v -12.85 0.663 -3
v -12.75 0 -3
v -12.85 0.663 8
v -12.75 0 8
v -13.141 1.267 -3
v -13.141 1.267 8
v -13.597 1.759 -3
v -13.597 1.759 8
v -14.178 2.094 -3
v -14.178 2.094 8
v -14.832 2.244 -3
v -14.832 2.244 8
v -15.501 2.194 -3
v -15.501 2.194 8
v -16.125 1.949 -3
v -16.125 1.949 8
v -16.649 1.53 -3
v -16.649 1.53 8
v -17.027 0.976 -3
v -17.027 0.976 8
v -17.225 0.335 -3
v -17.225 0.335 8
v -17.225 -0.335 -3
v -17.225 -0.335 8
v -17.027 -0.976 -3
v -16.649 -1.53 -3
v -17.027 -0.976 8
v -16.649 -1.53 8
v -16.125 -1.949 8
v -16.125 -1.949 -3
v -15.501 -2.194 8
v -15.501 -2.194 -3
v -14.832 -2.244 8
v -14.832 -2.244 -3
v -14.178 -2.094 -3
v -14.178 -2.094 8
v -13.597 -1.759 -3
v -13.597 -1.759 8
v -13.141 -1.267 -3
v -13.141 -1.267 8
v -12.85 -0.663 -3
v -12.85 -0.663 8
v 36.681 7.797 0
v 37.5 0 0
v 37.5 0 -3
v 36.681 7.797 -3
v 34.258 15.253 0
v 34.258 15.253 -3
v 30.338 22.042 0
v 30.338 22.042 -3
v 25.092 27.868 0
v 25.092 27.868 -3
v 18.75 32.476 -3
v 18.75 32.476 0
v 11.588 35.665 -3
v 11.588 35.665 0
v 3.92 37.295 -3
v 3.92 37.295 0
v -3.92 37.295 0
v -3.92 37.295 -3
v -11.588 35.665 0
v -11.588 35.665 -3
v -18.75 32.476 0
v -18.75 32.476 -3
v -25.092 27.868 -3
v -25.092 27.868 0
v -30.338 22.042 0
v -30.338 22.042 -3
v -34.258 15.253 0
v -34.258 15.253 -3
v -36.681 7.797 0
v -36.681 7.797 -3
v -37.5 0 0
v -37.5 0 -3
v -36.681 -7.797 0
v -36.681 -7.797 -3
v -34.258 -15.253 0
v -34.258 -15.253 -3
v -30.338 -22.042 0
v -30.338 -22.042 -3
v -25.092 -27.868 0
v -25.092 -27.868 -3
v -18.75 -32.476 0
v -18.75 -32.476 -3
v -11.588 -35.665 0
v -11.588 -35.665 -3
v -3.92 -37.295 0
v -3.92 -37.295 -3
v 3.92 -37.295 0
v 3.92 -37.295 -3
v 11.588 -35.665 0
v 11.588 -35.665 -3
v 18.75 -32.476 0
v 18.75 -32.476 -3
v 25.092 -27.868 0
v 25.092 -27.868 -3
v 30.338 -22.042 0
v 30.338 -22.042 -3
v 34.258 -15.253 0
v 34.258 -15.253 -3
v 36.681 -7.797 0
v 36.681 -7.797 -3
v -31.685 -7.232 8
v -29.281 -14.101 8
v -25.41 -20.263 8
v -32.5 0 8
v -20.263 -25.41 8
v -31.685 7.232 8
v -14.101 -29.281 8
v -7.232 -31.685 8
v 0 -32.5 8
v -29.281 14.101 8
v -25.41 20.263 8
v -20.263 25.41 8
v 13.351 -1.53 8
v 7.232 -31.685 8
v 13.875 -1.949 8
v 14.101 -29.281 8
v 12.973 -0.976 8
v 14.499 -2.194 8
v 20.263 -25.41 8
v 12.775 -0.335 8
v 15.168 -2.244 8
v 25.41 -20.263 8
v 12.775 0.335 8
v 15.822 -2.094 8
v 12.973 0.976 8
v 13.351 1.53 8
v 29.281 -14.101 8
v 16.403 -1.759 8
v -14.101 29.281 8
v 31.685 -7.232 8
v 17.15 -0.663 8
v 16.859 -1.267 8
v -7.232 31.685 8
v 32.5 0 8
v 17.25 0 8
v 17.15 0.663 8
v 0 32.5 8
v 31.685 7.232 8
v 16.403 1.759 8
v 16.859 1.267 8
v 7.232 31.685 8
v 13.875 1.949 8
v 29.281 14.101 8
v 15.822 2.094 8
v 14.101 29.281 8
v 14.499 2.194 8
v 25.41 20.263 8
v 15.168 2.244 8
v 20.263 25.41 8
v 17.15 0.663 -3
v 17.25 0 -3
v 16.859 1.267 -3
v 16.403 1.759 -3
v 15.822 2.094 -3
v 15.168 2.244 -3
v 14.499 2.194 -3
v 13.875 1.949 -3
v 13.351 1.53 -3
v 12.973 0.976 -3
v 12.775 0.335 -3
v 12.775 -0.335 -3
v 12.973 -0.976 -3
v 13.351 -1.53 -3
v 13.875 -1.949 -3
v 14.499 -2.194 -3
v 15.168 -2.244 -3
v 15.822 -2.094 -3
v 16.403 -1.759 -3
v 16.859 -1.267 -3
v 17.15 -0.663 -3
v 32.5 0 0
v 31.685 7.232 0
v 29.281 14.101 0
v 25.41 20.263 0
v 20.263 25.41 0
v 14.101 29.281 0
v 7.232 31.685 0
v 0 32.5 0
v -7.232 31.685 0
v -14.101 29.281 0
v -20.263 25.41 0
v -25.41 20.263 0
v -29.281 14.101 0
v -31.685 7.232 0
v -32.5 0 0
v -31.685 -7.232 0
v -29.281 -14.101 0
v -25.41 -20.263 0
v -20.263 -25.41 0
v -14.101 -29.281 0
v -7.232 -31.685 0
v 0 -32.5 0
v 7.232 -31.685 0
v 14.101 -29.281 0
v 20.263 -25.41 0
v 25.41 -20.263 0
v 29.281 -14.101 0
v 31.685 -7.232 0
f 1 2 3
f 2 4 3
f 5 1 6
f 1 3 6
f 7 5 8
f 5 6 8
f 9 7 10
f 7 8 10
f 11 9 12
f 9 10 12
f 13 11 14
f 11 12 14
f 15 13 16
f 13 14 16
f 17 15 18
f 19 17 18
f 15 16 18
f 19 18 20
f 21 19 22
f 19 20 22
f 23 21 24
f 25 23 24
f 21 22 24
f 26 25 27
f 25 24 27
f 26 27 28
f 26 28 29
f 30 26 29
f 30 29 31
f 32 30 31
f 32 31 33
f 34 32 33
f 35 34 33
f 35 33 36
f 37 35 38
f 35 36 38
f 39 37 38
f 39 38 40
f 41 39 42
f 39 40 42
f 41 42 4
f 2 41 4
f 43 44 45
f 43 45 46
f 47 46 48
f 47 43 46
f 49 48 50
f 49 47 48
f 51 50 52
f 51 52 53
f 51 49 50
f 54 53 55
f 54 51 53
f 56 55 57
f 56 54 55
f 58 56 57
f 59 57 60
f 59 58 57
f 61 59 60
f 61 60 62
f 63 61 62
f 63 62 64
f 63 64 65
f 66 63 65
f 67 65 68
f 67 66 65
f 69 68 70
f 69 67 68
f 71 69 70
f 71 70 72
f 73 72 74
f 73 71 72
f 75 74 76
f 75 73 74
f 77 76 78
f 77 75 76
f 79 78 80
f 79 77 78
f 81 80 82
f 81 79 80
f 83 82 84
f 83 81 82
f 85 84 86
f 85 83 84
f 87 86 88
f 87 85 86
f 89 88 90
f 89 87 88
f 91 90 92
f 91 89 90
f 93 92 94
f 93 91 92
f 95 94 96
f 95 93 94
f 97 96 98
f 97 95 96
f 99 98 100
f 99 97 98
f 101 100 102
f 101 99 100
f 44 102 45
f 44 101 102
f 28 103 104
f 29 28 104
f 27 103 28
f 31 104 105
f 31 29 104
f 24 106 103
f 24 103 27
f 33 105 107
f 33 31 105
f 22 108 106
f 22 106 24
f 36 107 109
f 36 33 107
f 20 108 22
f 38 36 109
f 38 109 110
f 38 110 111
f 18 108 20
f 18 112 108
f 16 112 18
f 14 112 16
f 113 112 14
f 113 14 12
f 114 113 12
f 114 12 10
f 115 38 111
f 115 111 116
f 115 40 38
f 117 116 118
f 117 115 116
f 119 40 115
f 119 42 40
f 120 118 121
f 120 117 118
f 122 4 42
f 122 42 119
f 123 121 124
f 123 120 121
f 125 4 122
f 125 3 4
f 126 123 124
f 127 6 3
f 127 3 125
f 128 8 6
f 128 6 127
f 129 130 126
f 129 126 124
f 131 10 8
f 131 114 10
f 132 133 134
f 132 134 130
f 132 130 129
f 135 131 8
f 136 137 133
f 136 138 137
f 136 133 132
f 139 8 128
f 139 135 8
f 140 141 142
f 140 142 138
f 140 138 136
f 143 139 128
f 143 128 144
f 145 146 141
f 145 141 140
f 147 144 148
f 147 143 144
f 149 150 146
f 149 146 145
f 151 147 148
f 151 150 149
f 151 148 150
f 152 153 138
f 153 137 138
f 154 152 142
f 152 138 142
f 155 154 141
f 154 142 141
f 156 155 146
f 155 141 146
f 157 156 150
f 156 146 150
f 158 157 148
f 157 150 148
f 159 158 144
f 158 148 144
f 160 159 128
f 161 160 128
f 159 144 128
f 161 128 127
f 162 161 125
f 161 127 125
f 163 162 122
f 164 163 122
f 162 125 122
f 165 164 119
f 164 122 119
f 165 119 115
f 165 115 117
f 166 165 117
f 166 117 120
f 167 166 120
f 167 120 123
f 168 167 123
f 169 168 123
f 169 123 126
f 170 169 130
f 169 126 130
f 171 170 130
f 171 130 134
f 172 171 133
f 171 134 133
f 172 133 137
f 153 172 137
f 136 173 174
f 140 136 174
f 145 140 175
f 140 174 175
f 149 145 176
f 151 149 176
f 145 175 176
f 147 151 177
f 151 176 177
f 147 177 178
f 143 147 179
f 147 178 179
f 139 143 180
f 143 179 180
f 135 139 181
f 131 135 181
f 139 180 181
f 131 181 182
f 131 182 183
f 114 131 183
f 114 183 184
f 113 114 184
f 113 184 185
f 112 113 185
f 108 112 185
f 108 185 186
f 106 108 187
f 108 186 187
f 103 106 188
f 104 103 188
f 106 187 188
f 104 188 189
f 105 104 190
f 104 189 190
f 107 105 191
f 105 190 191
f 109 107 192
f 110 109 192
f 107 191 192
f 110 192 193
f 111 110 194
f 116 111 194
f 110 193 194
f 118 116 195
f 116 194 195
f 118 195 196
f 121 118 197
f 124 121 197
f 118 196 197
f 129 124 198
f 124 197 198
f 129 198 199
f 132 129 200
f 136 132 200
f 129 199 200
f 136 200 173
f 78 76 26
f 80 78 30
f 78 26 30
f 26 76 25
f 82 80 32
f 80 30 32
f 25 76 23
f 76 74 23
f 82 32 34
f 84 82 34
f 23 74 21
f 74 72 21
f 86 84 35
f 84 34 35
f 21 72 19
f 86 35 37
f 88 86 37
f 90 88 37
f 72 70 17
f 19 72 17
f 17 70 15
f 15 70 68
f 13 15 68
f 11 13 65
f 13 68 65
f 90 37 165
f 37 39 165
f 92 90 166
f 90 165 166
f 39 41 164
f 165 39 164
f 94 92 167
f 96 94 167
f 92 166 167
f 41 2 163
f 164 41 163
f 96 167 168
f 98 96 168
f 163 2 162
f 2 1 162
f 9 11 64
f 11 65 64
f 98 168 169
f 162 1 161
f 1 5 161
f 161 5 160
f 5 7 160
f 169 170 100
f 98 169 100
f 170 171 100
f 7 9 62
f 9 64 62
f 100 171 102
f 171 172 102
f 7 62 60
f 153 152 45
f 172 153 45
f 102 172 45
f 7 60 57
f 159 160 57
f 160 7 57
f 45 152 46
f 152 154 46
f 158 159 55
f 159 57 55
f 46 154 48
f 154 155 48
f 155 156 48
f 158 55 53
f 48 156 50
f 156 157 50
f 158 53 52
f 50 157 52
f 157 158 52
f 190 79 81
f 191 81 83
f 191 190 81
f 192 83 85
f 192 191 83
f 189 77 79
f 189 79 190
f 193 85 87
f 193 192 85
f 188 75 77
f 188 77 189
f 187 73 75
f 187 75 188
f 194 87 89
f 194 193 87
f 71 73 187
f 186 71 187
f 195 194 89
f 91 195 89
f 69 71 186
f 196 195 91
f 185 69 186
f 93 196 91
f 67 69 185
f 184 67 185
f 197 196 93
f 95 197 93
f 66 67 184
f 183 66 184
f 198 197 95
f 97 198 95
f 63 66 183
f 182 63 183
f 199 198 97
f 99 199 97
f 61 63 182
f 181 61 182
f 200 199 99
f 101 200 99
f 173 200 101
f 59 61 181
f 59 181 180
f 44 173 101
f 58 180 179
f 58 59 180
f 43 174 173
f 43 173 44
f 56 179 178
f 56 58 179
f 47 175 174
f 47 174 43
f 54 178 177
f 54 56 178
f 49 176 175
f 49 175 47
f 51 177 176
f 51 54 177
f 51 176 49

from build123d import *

# Parameters (mm, degrees)
SKETCH_R          = 32.5
PAD_DEPTH         = 8
SKETCH001_R       = 37.5
PAD001_DEPTH      = 3
SKETCH002_R       = 2.25
POCKET_DEPTH      = 3.001
POCKET_DEPTH_BACK = -8.001


with BuildPart() as part:
    # Sketch → Pad (new body)
    with BuildSketch(Plane.XY):
        Circle(SKETCH_R)
    extrude(amount=PAD_DEPTH)

    # Sketch001 → Pad001 (join)
    with BuildSketch(Plane.XY):
        Circle(SKETCH001_R)
    extrude(amount=-PAD001_DEPTH)

    # Sketch002 → Pocket (cut, two sides)
    with BuildSketch(Plane.XY) as pocket_sk:
        with Locations((-15, 0)):
            Circle(SKETCH002_R)
        with Locations((15, 0)):
            Circle(SKETCH002_R)
    extrude(amount=-POCKET_DEPTH, mode=Mode.SUBTRACT)
    extrude(pocket_sk.sketch, amount=-POCKET_DEPTH_BACK, mode=Mode.SUBTRACT)


solid = part.part
